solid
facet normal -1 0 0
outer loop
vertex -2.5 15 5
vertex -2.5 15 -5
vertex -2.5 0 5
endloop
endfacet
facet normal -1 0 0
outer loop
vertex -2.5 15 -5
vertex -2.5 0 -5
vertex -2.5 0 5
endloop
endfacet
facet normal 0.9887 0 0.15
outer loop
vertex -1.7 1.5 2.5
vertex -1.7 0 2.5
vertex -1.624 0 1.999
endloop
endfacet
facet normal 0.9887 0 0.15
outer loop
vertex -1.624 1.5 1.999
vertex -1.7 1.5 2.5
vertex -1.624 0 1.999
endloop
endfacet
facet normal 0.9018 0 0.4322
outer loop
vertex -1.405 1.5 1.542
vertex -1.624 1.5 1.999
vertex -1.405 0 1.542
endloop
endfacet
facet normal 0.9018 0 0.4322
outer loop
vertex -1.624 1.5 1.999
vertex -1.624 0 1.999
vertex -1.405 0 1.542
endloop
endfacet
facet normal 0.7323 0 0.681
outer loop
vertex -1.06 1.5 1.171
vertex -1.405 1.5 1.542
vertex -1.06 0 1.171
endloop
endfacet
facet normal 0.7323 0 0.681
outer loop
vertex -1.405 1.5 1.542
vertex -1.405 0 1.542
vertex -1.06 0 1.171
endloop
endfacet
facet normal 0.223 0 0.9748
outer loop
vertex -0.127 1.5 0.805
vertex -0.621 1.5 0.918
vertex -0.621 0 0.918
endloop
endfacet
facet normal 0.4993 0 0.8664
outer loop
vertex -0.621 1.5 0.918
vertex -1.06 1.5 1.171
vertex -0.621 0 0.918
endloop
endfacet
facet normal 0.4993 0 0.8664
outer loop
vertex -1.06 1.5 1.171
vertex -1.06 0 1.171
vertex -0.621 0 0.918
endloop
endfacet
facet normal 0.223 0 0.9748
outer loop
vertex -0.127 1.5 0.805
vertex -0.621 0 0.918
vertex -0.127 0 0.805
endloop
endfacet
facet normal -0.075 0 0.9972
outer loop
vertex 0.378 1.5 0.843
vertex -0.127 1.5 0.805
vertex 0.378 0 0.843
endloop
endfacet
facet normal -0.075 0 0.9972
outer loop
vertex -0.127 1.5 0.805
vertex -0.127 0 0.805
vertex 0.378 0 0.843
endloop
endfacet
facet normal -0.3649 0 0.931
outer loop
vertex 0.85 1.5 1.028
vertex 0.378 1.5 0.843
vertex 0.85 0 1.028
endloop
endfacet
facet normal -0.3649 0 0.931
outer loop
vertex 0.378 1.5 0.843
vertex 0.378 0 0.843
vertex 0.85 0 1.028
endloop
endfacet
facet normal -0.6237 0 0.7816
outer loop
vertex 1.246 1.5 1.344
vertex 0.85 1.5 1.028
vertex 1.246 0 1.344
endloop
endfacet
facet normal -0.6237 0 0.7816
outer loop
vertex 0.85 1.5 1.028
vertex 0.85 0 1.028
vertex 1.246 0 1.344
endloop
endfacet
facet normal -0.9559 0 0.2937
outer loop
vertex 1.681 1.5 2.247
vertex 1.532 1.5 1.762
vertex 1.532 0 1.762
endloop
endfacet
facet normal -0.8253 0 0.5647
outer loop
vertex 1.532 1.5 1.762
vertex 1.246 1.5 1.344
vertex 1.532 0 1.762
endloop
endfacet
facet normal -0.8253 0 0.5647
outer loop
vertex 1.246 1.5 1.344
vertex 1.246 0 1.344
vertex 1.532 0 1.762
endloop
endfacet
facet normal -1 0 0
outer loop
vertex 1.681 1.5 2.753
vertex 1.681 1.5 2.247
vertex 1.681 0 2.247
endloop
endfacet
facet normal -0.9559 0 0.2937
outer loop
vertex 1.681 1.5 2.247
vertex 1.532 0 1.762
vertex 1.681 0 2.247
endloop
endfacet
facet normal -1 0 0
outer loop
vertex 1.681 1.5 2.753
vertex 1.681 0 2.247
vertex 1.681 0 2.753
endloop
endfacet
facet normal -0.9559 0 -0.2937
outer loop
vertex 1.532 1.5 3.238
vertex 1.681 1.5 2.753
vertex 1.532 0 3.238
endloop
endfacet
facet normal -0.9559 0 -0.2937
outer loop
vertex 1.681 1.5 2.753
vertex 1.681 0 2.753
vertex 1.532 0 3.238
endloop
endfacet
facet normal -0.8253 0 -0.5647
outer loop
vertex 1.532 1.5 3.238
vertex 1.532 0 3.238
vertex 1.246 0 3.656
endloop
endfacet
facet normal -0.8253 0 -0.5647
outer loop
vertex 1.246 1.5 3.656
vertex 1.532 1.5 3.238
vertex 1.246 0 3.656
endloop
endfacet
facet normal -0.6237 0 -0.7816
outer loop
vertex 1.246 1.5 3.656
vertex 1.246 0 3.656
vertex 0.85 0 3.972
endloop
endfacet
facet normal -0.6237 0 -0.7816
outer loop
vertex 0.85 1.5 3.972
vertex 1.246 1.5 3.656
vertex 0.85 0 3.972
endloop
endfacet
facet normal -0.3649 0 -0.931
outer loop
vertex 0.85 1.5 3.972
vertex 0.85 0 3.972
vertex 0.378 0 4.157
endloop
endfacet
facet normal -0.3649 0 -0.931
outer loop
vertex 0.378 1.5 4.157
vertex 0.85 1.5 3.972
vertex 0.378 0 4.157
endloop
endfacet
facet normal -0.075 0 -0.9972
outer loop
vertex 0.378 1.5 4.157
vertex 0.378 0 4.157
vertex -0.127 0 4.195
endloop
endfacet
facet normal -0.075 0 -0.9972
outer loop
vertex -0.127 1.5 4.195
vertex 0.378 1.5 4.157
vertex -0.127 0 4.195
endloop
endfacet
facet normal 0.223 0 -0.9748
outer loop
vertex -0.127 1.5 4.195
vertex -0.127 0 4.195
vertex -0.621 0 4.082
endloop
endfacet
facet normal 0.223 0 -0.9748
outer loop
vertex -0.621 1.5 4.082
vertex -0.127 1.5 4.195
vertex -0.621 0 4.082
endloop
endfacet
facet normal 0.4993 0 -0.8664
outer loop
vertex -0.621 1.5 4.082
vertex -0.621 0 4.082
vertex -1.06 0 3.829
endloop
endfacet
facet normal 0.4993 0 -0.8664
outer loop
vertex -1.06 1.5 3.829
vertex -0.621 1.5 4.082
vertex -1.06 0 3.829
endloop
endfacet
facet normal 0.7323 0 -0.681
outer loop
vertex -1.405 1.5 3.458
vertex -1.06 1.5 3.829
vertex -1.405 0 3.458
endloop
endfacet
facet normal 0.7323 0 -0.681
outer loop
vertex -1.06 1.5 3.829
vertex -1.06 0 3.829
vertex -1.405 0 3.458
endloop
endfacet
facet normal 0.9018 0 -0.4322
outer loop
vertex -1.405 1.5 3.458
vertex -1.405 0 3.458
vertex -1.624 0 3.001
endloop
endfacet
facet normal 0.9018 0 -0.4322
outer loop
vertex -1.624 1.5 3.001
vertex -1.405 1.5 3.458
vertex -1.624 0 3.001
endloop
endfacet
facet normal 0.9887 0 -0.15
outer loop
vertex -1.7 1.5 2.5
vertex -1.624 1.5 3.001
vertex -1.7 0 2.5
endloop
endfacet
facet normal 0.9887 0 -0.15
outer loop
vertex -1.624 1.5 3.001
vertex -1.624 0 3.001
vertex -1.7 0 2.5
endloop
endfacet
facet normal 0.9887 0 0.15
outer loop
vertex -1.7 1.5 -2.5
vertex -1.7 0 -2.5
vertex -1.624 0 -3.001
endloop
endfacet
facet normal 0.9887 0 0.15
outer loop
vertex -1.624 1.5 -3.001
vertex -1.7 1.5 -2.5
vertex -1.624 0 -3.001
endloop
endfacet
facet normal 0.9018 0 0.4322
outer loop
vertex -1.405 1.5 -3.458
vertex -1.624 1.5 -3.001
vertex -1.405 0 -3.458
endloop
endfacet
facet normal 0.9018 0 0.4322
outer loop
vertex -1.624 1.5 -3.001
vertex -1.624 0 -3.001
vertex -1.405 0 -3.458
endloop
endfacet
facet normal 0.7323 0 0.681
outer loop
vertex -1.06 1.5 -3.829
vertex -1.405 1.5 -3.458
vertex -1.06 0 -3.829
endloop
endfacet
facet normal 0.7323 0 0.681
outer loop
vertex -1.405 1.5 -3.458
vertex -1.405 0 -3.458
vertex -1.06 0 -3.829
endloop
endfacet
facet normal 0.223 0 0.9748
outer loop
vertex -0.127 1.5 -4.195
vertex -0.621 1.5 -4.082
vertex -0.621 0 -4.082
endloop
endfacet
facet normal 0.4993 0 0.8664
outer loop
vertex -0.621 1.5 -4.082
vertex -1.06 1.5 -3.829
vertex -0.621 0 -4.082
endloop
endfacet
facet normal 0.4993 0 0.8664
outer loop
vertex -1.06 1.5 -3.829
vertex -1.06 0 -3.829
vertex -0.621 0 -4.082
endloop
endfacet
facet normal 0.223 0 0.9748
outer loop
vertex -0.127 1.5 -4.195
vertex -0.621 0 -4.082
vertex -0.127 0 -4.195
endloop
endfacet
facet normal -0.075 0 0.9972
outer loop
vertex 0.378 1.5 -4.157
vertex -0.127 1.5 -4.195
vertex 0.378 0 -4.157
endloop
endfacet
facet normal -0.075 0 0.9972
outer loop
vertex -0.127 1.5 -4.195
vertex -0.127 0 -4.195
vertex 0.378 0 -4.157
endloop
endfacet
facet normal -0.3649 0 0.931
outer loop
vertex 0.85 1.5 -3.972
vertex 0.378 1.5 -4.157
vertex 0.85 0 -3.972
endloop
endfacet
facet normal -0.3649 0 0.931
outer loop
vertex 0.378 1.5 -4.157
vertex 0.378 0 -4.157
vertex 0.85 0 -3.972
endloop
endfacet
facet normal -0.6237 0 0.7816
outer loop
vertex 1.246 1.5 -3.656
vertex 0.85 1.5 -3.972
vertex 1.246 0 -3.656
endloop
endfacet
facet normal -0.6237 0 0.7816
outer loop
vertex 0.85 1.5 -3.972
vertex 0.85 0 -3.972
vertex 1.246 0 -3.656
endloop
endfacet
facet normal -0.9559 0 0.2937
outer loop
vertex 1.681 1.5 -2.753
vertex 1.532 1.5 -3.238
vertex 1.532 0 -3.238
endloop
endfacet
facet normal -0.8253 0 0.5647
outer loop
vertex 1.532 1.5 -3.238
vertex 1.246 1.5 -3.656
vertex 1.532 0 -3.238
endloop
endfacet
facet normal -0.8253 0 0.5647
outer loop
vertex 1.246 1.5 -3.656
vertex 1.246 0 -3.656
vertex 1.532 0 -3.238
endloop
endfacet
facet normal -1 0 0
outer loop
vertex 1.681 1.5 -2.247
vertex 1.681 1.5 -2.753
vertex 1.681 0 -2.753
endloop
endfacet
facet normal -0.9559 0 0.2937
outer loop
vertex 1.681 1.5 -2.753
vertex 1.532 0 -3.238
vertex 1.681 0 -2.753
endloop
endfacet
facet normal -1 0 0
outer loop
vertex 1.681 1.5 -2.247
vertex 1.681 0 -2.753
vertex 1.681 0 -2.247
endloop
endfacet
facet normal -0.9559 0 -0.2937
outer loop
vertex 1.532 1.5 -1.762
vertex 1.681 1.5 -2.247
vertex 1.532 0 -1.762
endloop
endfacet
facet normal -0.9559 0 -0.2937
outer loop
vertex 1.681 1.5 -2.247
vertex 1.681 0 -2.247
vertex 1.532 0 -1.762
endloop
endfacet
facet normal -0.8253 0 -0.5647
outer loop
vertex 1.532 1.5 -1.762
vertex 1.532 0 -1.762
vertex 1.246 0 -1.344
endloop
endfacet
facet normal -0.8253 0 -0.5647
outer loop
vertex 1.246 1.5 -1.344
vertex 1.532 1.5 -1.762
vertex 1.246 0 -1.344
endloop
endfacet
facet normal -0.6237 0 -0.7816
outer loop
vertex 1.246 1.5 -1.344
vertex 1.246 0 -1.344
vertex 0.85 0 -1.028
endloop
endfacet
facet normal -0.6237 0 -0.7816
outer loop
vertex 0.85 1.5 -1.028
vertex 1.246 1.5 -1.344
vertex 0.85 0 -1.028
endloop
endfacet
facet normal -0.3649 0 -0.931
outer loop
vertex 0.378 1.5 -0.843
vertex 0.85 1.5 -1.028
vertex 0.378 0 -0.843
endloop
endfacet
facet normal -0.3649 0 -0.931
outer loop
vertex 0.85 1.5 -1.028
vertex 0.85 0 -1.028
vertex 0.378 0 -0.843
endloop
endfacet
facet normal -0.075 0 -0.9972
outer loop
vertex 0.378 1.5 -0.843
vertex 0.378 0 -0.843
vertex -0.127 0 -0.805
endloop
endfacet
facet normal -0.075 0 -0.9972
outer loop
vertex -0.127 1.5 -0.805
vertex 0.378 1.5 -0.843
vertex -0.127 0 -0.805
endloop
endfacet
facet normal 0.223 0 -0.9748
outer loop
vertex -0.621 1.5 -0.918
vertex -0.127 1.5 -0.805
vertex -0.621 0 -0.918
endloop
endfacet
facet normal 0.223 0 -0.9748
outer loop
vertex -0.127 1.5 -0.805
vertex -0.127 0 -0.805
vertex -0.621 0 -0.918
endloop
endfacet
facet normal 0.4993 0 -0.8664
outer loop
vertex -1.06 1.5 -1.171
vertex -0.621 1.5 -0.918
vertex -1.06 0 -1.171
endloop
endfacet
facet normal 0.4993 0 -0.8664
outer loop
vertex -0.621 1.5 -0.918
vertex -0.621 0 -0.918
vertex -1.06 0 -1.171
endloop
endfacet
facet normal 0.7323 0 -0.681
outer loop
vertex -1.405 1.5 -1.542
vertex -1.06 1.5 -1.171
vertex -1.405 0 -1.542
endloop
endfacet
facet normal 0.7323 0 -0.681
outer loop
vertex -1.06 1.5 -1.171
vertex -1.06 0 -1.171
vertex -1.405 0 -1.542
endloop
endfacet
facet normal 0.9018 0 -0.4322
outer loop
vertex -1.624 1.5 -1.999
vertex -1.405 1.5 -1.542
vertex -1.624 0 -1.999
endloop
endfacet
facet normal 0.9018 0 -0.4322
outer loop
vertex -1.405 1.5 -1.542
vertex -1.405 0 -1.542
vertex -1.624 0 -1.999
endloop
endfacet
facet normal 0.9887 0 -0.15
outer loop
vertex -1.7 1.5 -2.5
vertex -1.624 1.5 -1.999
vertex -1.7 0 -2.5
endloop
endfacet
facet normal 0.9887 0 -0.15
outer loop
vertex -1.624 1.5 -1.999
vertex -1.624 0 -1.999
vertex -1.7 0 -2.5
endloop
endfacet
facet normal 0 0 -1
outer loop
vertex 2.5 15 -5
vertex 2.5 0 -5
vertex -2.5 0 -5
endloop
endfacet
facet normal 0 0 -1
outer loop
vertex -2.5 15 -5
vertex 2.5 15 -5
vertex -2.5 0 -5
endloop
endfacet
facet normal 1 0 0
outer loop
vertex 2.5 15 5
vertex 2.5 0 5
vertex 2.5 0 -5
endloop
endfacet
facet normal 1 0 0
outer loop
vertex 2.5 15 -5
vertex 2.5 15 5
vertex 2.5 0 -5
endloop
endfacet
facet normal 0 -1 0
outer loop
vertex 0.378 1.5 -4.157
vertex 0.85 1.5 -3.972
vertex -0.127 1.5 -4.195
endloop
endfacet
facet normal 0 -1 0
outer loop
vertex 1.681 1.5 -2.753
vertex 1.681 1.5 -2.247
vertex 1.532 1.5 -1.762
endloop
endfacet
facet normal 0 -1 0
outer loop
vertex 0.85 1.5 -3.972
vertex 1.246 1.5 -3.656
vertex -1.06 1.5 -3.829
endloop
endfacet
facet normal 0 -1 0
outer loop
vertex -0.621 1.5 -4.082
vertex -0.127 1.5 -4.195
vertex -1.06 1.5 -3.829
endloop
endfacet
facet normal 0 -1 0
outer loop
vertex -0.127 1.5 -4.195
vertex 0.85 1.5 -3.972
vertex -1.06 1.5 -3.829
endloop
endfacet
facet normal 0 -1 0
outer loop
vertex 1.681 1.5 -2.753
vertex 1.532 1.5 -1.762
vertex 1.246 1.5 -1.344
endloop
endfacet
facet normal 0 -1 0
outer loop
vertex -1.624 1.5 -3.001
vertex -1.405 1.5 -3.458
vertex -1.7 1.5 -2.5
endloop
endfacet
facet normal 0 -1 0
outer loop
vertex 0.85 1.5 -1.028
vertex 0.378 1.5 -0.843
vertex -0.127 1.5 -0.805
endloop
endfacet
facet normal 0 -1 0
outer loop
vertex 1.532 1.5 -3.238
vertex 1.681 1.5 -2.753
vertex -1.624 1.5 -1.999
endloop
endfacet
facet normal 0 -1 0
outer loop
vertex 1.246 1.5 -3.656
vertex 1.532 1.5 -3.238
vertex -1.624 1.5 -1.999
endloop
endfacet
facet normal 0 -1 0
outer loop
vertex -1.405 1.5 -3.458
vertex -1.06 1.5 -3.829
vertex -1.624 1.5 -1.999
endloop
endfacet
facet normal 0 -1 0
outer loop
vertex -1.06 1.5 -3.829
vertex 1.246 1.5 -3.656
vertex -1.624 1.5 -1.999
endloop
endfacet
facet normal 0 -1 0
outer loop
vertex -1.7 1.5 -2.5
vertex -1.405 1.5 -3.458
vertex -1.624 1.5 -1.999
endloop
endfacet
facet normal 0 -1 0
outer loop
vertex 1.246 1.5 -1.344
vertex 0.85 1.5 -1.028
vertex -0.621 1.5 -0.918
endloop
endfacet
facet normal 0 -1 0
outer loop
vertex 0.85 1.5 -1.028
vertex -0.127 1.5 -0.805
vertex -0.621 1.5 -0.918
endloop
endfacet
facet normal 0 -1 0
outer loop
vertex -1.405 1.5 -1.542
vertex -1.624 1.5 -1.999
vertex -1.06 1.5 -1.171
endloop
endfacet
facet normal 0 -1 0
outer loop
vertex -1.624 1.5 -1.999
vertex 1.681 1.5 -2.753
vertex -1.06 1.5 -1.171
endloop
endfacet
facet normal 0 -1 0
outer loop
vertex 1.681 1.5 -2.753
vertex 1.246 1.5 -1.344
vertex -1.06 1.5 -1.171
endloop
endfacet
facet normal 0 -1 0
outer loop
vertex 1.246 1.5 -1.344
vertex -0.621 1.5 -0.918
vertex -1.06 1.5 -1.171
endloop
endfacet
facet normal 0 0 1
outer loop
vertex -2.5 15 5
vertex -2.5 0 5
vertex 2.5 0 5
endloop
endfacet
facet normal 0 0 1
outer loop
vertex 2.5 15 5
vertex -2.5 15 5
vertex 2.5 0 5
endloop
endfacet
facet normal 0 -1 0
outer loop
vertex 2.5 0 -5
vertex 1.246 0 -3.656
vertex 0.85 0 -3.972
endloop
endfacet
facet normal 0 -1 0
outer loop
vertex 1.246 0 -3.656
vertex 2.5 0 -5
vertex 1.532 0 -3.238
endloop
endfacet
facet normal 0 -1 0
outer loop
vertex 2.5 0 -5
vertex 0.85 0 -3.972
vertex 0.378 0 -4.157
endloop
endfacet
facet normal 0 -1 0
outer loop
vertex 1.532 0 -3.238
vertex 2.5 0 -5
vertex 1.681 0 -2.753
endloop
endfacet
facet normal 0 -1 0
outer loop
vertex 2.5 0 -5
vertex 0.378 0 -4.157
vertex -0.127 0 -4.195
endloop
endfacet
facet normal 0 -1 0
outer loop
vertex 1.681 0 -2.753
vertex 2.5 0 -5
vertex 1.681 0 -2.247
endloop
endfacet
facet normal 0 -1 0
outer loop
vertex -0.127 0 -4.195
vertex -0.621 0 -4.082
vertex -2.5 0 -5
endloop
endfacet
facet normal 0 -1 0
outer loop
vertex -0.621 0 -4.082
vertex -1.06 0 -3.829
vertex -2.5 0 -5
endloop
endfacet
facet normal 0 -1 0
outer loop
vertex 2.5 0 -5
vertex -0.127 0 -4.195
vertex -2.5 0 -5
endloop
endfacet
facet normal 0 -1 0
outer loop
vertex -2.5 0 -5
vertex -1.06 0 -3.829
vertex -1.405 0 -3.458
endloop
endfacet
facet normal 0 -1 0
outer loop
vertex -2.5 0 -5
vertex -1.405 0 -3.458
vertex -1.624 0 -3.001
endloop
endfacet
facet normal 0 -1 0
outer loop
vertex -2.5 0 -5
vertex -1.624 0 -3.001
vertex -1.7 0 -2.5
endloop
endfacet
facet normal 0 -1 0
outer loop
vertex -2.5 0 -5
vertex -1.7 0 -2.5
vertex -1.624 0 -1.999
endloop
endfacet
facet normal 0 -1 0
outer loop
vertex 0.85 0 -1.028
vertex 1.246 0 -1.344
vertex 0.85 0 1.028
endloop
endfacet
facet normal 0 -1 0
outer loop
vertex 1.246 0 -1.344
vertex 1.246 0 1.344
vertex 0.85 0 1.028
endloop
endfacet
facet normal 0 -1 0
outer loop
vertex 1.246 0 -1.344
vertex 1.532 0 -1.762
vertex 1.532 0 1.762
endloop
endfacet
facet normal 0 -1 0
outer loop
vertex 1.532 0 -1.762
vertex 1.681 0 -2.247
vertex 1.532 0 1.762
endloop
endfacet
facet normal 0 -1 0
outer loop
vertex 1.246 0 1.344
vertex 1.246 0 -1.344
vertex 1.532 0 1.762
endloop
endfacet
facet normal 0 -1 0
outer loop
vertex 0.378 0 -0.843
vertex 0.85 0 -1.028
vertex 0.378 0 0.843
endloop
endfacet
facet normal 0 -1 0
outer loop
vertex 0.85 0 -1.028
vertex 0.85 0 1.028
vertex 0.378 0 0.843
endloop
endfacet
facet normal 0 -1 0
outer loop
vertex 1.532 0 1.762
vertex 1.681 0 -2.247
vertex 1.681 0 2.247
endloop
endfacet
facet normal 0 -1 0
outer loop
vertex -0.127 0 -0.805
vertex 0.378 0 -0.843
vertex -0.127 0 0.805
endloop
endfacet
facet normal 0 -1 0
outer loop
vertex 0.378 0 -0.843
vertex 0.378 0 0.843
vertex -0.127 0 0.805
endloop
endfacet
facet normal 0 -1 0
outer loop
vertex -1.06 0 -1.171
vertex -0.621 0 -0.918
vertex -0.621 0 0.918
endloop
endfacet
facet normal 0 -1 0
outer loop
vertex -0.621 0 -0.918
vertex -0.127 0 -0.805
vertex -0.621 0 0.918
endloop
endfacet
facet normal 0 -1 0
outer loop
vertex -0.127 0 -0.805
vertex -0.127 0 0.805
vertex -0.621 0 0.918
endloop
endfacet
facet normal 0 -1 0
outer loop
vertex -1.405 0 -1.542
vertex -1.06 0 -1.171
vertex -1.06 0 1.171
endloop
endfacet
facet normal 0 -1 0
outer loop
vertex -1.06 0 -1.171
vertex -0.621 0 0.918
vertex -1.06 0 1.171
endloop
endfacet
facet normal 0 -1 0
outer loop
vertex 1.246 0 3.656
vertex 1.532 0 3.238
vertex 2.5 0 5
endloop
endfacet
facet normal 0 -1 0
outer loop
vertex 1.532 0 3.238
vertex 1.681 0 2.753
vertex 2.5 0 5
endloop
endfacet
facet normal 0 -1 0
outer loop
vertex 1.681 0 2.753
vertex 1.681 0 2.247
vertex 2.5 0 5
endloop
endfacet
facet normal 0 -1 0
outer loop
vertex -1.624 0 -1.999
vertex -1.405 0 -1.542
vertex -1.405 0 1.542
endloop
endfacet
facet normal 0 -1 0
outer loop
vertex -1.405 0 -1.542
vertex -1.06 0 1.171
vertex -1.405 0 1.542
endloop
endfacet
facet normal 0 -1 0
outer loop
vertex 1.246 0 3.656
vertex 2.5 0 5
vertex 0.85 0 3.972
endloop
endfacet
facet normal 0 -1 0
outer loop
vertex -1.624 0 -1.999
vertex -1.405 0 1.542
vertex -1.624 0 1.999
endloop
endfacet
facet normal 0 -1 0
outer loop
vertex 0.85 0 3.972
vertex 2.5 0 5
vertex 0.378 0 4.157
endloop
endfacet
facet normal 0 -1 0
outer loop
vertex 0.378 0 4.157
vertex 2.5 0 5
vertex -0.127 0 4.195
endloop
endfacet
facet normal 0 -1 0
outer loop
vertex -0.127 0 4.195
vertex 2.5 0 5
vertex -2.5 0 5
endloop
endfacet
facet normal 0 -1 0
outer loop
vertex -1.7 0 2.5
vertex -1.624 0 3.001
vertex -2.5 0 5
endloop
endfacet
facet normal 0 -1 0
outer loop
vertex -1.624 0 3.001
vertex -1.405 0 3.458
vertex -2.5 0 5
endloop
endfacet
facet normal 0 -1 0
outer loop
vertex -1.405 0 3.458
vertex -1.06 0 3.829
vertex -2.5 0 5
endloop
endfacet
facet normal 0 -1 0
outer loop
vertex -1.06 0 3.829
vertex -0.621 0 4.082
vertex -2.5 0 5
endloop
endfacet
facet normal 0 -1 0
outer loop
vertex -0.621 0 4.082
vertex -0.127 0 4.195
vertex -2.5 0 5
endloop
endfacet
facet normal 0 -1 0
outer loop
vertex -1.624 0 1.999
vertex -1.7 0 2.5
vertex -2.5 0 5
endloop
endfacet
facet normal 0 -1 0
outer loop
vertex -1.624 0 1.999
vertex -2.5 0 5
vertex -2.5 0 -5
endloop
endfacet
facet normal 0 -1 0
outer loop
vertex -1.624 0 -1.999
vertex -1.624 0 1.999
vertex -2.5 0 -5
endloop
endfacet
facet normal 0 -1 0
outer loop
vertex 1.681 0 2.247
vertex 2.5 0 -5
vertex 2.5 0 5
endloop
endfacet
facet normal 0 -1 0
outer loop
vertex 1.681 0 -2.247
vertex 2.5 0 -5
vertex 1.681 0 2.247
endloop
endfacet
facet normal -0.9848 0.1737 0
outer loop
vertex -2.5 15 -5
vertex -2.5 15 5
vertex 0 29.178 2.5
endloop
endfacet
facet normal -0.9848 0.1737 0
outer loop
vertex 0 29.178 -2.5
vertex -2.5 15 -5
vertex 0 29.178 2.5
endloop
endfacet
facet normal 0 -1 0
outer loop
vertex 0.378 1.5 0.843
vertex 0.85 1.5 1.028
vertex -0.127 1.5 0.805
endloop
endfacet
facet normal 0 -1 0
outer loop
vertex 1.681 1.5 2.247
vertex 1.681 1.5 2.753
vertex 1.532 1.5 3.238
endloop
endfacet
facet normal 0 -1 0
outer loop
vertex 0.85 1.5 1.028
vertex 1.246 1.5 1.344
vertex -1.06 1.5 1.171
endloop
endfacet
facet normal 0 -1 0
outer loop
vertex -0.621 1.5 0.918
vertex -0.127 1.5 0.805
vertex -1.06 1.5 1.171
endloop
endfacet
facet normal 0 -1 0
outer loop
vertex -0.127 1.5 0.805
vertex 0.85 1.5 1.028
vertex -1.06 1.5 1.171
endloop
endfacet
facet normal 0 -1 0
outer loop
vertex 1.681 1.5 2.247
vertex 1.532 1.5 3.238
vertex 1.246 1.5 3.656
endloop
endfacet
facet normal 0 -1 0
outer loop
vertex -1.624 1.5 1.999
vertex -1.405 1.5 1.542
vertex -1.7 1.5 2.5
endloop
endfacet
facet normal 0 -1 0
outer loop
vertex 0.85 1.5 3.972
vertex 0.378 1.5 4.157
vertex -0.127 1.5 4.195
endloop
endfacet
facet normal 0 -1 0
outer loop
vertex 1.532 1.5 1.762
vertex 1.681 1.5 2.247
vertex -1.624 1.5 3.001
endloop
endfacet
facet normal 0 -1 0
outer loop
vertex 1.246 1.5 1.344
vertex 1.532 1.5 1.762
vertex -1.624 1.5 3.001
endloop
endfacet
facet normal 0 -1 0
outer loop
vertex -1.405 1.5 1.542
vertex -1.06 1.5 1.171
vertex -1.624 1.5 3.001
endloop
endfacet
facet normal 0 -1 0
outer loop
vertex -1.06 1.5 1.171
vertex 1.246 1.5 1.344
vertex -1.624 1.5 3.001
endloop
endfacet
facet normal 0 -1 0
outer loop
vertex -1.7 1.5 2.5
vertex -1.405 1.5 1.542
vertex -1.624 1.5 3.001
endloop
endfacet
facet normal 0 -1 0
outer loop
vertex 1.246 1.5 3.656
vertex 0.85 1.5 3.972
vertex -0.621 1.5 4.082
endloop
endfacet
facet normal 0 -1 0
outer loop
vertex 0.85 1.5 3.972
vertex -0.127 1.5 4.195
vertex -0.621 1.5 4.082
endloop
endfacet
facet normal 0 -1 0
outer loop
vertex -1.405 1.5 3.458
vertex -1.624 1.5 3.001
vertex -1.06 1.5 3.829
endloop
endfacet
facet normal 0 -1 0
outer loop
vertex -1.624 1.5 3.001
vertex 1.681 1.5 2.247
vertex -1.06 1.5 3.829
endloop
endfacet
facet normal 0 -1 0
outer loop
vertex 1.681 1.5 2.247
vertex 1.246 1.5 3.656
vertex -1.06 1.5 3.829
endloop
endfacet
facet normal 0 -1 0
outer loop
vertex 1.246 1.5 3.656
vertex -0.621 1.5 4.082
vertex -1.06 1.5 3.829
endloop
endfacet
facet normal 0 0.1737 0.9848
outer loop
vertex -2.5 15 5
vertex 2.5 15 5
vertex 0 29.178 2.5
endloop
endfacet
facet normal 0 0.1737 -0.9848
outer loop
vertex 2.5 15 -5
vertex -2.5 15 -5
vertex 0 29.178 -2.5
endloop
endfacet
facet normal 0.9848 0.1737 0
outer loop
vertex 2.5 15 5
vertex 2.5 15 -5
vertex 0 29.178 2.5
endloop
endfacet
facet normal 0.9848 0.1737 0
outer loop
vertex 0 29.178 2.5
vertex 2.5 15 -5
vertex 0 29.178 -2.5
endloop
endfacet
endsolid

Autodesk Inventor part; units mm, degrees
ref_plane "YZ Plane" through (0, 0, 0) normal (1, 0, 0) x (0, 1, 0)
ref_plane "XZ Plane" through (0, 0, 0) normal (0, 1, 0) x (-1, 0, 0)
ref_plane "XY Plane" through (0, 0, 0) normal (0, 0, 1) x (1, 0, 0)
sketch "草圖1" plane through (0, 0, 0) normal (0, 1, 0) x (-1, 0, 0)
  line L0 (2.5, 5) -> (-2.5, 5)
  line L1 (-2.5, 5) -> (-2.5, -5)
  line L2 (-2.5, -5) -> (2.5, -5)
  line L3 (2.5, -5) -> (2.5, 5)
  circle A0 centre (0, 2.5) radius 1.7
  point P0 (0, 0)
  point P1 (0, -5)
  point P2 (2.5, 0)
  dimension "d0" = 5
  dimension "d1" = 10
  dimension "d2" = 3.4
  dimension "d3" = 2.5
  dimension "d4" = 2.5
extrude "擠出1" add sketch "草圖1" along normal blind 15 contours L3 L2 L1 L0 | A0
extrude "擠出2" cut sketch "草圖1" along normal blind 1.5 contours A0
pattern_linear "矩形陣列1" count 2 spacing 5 along (0, 0, -1) of "擠出2"
sketch "草圖3" plane through (0, 15, 0) normal (0, 1, 0) x (1, 0, 0)
  line L0 (2.5, -5) -> (2.5, 5) projected
  line L1 (2.5, 5) -> (-2.5, 5) projected
  line L2 (-2.5, 5) -> (-2.5, -5) projected
  line L3 (-2.5, -5) -> (2.5, -5) projected
  point P0 (0, 0)
extrude "擠出4" add sketch "草圖3" along normal blind 20 draft -10
properties part number "110033226_ipt_40_背流拱橋裝飾"
